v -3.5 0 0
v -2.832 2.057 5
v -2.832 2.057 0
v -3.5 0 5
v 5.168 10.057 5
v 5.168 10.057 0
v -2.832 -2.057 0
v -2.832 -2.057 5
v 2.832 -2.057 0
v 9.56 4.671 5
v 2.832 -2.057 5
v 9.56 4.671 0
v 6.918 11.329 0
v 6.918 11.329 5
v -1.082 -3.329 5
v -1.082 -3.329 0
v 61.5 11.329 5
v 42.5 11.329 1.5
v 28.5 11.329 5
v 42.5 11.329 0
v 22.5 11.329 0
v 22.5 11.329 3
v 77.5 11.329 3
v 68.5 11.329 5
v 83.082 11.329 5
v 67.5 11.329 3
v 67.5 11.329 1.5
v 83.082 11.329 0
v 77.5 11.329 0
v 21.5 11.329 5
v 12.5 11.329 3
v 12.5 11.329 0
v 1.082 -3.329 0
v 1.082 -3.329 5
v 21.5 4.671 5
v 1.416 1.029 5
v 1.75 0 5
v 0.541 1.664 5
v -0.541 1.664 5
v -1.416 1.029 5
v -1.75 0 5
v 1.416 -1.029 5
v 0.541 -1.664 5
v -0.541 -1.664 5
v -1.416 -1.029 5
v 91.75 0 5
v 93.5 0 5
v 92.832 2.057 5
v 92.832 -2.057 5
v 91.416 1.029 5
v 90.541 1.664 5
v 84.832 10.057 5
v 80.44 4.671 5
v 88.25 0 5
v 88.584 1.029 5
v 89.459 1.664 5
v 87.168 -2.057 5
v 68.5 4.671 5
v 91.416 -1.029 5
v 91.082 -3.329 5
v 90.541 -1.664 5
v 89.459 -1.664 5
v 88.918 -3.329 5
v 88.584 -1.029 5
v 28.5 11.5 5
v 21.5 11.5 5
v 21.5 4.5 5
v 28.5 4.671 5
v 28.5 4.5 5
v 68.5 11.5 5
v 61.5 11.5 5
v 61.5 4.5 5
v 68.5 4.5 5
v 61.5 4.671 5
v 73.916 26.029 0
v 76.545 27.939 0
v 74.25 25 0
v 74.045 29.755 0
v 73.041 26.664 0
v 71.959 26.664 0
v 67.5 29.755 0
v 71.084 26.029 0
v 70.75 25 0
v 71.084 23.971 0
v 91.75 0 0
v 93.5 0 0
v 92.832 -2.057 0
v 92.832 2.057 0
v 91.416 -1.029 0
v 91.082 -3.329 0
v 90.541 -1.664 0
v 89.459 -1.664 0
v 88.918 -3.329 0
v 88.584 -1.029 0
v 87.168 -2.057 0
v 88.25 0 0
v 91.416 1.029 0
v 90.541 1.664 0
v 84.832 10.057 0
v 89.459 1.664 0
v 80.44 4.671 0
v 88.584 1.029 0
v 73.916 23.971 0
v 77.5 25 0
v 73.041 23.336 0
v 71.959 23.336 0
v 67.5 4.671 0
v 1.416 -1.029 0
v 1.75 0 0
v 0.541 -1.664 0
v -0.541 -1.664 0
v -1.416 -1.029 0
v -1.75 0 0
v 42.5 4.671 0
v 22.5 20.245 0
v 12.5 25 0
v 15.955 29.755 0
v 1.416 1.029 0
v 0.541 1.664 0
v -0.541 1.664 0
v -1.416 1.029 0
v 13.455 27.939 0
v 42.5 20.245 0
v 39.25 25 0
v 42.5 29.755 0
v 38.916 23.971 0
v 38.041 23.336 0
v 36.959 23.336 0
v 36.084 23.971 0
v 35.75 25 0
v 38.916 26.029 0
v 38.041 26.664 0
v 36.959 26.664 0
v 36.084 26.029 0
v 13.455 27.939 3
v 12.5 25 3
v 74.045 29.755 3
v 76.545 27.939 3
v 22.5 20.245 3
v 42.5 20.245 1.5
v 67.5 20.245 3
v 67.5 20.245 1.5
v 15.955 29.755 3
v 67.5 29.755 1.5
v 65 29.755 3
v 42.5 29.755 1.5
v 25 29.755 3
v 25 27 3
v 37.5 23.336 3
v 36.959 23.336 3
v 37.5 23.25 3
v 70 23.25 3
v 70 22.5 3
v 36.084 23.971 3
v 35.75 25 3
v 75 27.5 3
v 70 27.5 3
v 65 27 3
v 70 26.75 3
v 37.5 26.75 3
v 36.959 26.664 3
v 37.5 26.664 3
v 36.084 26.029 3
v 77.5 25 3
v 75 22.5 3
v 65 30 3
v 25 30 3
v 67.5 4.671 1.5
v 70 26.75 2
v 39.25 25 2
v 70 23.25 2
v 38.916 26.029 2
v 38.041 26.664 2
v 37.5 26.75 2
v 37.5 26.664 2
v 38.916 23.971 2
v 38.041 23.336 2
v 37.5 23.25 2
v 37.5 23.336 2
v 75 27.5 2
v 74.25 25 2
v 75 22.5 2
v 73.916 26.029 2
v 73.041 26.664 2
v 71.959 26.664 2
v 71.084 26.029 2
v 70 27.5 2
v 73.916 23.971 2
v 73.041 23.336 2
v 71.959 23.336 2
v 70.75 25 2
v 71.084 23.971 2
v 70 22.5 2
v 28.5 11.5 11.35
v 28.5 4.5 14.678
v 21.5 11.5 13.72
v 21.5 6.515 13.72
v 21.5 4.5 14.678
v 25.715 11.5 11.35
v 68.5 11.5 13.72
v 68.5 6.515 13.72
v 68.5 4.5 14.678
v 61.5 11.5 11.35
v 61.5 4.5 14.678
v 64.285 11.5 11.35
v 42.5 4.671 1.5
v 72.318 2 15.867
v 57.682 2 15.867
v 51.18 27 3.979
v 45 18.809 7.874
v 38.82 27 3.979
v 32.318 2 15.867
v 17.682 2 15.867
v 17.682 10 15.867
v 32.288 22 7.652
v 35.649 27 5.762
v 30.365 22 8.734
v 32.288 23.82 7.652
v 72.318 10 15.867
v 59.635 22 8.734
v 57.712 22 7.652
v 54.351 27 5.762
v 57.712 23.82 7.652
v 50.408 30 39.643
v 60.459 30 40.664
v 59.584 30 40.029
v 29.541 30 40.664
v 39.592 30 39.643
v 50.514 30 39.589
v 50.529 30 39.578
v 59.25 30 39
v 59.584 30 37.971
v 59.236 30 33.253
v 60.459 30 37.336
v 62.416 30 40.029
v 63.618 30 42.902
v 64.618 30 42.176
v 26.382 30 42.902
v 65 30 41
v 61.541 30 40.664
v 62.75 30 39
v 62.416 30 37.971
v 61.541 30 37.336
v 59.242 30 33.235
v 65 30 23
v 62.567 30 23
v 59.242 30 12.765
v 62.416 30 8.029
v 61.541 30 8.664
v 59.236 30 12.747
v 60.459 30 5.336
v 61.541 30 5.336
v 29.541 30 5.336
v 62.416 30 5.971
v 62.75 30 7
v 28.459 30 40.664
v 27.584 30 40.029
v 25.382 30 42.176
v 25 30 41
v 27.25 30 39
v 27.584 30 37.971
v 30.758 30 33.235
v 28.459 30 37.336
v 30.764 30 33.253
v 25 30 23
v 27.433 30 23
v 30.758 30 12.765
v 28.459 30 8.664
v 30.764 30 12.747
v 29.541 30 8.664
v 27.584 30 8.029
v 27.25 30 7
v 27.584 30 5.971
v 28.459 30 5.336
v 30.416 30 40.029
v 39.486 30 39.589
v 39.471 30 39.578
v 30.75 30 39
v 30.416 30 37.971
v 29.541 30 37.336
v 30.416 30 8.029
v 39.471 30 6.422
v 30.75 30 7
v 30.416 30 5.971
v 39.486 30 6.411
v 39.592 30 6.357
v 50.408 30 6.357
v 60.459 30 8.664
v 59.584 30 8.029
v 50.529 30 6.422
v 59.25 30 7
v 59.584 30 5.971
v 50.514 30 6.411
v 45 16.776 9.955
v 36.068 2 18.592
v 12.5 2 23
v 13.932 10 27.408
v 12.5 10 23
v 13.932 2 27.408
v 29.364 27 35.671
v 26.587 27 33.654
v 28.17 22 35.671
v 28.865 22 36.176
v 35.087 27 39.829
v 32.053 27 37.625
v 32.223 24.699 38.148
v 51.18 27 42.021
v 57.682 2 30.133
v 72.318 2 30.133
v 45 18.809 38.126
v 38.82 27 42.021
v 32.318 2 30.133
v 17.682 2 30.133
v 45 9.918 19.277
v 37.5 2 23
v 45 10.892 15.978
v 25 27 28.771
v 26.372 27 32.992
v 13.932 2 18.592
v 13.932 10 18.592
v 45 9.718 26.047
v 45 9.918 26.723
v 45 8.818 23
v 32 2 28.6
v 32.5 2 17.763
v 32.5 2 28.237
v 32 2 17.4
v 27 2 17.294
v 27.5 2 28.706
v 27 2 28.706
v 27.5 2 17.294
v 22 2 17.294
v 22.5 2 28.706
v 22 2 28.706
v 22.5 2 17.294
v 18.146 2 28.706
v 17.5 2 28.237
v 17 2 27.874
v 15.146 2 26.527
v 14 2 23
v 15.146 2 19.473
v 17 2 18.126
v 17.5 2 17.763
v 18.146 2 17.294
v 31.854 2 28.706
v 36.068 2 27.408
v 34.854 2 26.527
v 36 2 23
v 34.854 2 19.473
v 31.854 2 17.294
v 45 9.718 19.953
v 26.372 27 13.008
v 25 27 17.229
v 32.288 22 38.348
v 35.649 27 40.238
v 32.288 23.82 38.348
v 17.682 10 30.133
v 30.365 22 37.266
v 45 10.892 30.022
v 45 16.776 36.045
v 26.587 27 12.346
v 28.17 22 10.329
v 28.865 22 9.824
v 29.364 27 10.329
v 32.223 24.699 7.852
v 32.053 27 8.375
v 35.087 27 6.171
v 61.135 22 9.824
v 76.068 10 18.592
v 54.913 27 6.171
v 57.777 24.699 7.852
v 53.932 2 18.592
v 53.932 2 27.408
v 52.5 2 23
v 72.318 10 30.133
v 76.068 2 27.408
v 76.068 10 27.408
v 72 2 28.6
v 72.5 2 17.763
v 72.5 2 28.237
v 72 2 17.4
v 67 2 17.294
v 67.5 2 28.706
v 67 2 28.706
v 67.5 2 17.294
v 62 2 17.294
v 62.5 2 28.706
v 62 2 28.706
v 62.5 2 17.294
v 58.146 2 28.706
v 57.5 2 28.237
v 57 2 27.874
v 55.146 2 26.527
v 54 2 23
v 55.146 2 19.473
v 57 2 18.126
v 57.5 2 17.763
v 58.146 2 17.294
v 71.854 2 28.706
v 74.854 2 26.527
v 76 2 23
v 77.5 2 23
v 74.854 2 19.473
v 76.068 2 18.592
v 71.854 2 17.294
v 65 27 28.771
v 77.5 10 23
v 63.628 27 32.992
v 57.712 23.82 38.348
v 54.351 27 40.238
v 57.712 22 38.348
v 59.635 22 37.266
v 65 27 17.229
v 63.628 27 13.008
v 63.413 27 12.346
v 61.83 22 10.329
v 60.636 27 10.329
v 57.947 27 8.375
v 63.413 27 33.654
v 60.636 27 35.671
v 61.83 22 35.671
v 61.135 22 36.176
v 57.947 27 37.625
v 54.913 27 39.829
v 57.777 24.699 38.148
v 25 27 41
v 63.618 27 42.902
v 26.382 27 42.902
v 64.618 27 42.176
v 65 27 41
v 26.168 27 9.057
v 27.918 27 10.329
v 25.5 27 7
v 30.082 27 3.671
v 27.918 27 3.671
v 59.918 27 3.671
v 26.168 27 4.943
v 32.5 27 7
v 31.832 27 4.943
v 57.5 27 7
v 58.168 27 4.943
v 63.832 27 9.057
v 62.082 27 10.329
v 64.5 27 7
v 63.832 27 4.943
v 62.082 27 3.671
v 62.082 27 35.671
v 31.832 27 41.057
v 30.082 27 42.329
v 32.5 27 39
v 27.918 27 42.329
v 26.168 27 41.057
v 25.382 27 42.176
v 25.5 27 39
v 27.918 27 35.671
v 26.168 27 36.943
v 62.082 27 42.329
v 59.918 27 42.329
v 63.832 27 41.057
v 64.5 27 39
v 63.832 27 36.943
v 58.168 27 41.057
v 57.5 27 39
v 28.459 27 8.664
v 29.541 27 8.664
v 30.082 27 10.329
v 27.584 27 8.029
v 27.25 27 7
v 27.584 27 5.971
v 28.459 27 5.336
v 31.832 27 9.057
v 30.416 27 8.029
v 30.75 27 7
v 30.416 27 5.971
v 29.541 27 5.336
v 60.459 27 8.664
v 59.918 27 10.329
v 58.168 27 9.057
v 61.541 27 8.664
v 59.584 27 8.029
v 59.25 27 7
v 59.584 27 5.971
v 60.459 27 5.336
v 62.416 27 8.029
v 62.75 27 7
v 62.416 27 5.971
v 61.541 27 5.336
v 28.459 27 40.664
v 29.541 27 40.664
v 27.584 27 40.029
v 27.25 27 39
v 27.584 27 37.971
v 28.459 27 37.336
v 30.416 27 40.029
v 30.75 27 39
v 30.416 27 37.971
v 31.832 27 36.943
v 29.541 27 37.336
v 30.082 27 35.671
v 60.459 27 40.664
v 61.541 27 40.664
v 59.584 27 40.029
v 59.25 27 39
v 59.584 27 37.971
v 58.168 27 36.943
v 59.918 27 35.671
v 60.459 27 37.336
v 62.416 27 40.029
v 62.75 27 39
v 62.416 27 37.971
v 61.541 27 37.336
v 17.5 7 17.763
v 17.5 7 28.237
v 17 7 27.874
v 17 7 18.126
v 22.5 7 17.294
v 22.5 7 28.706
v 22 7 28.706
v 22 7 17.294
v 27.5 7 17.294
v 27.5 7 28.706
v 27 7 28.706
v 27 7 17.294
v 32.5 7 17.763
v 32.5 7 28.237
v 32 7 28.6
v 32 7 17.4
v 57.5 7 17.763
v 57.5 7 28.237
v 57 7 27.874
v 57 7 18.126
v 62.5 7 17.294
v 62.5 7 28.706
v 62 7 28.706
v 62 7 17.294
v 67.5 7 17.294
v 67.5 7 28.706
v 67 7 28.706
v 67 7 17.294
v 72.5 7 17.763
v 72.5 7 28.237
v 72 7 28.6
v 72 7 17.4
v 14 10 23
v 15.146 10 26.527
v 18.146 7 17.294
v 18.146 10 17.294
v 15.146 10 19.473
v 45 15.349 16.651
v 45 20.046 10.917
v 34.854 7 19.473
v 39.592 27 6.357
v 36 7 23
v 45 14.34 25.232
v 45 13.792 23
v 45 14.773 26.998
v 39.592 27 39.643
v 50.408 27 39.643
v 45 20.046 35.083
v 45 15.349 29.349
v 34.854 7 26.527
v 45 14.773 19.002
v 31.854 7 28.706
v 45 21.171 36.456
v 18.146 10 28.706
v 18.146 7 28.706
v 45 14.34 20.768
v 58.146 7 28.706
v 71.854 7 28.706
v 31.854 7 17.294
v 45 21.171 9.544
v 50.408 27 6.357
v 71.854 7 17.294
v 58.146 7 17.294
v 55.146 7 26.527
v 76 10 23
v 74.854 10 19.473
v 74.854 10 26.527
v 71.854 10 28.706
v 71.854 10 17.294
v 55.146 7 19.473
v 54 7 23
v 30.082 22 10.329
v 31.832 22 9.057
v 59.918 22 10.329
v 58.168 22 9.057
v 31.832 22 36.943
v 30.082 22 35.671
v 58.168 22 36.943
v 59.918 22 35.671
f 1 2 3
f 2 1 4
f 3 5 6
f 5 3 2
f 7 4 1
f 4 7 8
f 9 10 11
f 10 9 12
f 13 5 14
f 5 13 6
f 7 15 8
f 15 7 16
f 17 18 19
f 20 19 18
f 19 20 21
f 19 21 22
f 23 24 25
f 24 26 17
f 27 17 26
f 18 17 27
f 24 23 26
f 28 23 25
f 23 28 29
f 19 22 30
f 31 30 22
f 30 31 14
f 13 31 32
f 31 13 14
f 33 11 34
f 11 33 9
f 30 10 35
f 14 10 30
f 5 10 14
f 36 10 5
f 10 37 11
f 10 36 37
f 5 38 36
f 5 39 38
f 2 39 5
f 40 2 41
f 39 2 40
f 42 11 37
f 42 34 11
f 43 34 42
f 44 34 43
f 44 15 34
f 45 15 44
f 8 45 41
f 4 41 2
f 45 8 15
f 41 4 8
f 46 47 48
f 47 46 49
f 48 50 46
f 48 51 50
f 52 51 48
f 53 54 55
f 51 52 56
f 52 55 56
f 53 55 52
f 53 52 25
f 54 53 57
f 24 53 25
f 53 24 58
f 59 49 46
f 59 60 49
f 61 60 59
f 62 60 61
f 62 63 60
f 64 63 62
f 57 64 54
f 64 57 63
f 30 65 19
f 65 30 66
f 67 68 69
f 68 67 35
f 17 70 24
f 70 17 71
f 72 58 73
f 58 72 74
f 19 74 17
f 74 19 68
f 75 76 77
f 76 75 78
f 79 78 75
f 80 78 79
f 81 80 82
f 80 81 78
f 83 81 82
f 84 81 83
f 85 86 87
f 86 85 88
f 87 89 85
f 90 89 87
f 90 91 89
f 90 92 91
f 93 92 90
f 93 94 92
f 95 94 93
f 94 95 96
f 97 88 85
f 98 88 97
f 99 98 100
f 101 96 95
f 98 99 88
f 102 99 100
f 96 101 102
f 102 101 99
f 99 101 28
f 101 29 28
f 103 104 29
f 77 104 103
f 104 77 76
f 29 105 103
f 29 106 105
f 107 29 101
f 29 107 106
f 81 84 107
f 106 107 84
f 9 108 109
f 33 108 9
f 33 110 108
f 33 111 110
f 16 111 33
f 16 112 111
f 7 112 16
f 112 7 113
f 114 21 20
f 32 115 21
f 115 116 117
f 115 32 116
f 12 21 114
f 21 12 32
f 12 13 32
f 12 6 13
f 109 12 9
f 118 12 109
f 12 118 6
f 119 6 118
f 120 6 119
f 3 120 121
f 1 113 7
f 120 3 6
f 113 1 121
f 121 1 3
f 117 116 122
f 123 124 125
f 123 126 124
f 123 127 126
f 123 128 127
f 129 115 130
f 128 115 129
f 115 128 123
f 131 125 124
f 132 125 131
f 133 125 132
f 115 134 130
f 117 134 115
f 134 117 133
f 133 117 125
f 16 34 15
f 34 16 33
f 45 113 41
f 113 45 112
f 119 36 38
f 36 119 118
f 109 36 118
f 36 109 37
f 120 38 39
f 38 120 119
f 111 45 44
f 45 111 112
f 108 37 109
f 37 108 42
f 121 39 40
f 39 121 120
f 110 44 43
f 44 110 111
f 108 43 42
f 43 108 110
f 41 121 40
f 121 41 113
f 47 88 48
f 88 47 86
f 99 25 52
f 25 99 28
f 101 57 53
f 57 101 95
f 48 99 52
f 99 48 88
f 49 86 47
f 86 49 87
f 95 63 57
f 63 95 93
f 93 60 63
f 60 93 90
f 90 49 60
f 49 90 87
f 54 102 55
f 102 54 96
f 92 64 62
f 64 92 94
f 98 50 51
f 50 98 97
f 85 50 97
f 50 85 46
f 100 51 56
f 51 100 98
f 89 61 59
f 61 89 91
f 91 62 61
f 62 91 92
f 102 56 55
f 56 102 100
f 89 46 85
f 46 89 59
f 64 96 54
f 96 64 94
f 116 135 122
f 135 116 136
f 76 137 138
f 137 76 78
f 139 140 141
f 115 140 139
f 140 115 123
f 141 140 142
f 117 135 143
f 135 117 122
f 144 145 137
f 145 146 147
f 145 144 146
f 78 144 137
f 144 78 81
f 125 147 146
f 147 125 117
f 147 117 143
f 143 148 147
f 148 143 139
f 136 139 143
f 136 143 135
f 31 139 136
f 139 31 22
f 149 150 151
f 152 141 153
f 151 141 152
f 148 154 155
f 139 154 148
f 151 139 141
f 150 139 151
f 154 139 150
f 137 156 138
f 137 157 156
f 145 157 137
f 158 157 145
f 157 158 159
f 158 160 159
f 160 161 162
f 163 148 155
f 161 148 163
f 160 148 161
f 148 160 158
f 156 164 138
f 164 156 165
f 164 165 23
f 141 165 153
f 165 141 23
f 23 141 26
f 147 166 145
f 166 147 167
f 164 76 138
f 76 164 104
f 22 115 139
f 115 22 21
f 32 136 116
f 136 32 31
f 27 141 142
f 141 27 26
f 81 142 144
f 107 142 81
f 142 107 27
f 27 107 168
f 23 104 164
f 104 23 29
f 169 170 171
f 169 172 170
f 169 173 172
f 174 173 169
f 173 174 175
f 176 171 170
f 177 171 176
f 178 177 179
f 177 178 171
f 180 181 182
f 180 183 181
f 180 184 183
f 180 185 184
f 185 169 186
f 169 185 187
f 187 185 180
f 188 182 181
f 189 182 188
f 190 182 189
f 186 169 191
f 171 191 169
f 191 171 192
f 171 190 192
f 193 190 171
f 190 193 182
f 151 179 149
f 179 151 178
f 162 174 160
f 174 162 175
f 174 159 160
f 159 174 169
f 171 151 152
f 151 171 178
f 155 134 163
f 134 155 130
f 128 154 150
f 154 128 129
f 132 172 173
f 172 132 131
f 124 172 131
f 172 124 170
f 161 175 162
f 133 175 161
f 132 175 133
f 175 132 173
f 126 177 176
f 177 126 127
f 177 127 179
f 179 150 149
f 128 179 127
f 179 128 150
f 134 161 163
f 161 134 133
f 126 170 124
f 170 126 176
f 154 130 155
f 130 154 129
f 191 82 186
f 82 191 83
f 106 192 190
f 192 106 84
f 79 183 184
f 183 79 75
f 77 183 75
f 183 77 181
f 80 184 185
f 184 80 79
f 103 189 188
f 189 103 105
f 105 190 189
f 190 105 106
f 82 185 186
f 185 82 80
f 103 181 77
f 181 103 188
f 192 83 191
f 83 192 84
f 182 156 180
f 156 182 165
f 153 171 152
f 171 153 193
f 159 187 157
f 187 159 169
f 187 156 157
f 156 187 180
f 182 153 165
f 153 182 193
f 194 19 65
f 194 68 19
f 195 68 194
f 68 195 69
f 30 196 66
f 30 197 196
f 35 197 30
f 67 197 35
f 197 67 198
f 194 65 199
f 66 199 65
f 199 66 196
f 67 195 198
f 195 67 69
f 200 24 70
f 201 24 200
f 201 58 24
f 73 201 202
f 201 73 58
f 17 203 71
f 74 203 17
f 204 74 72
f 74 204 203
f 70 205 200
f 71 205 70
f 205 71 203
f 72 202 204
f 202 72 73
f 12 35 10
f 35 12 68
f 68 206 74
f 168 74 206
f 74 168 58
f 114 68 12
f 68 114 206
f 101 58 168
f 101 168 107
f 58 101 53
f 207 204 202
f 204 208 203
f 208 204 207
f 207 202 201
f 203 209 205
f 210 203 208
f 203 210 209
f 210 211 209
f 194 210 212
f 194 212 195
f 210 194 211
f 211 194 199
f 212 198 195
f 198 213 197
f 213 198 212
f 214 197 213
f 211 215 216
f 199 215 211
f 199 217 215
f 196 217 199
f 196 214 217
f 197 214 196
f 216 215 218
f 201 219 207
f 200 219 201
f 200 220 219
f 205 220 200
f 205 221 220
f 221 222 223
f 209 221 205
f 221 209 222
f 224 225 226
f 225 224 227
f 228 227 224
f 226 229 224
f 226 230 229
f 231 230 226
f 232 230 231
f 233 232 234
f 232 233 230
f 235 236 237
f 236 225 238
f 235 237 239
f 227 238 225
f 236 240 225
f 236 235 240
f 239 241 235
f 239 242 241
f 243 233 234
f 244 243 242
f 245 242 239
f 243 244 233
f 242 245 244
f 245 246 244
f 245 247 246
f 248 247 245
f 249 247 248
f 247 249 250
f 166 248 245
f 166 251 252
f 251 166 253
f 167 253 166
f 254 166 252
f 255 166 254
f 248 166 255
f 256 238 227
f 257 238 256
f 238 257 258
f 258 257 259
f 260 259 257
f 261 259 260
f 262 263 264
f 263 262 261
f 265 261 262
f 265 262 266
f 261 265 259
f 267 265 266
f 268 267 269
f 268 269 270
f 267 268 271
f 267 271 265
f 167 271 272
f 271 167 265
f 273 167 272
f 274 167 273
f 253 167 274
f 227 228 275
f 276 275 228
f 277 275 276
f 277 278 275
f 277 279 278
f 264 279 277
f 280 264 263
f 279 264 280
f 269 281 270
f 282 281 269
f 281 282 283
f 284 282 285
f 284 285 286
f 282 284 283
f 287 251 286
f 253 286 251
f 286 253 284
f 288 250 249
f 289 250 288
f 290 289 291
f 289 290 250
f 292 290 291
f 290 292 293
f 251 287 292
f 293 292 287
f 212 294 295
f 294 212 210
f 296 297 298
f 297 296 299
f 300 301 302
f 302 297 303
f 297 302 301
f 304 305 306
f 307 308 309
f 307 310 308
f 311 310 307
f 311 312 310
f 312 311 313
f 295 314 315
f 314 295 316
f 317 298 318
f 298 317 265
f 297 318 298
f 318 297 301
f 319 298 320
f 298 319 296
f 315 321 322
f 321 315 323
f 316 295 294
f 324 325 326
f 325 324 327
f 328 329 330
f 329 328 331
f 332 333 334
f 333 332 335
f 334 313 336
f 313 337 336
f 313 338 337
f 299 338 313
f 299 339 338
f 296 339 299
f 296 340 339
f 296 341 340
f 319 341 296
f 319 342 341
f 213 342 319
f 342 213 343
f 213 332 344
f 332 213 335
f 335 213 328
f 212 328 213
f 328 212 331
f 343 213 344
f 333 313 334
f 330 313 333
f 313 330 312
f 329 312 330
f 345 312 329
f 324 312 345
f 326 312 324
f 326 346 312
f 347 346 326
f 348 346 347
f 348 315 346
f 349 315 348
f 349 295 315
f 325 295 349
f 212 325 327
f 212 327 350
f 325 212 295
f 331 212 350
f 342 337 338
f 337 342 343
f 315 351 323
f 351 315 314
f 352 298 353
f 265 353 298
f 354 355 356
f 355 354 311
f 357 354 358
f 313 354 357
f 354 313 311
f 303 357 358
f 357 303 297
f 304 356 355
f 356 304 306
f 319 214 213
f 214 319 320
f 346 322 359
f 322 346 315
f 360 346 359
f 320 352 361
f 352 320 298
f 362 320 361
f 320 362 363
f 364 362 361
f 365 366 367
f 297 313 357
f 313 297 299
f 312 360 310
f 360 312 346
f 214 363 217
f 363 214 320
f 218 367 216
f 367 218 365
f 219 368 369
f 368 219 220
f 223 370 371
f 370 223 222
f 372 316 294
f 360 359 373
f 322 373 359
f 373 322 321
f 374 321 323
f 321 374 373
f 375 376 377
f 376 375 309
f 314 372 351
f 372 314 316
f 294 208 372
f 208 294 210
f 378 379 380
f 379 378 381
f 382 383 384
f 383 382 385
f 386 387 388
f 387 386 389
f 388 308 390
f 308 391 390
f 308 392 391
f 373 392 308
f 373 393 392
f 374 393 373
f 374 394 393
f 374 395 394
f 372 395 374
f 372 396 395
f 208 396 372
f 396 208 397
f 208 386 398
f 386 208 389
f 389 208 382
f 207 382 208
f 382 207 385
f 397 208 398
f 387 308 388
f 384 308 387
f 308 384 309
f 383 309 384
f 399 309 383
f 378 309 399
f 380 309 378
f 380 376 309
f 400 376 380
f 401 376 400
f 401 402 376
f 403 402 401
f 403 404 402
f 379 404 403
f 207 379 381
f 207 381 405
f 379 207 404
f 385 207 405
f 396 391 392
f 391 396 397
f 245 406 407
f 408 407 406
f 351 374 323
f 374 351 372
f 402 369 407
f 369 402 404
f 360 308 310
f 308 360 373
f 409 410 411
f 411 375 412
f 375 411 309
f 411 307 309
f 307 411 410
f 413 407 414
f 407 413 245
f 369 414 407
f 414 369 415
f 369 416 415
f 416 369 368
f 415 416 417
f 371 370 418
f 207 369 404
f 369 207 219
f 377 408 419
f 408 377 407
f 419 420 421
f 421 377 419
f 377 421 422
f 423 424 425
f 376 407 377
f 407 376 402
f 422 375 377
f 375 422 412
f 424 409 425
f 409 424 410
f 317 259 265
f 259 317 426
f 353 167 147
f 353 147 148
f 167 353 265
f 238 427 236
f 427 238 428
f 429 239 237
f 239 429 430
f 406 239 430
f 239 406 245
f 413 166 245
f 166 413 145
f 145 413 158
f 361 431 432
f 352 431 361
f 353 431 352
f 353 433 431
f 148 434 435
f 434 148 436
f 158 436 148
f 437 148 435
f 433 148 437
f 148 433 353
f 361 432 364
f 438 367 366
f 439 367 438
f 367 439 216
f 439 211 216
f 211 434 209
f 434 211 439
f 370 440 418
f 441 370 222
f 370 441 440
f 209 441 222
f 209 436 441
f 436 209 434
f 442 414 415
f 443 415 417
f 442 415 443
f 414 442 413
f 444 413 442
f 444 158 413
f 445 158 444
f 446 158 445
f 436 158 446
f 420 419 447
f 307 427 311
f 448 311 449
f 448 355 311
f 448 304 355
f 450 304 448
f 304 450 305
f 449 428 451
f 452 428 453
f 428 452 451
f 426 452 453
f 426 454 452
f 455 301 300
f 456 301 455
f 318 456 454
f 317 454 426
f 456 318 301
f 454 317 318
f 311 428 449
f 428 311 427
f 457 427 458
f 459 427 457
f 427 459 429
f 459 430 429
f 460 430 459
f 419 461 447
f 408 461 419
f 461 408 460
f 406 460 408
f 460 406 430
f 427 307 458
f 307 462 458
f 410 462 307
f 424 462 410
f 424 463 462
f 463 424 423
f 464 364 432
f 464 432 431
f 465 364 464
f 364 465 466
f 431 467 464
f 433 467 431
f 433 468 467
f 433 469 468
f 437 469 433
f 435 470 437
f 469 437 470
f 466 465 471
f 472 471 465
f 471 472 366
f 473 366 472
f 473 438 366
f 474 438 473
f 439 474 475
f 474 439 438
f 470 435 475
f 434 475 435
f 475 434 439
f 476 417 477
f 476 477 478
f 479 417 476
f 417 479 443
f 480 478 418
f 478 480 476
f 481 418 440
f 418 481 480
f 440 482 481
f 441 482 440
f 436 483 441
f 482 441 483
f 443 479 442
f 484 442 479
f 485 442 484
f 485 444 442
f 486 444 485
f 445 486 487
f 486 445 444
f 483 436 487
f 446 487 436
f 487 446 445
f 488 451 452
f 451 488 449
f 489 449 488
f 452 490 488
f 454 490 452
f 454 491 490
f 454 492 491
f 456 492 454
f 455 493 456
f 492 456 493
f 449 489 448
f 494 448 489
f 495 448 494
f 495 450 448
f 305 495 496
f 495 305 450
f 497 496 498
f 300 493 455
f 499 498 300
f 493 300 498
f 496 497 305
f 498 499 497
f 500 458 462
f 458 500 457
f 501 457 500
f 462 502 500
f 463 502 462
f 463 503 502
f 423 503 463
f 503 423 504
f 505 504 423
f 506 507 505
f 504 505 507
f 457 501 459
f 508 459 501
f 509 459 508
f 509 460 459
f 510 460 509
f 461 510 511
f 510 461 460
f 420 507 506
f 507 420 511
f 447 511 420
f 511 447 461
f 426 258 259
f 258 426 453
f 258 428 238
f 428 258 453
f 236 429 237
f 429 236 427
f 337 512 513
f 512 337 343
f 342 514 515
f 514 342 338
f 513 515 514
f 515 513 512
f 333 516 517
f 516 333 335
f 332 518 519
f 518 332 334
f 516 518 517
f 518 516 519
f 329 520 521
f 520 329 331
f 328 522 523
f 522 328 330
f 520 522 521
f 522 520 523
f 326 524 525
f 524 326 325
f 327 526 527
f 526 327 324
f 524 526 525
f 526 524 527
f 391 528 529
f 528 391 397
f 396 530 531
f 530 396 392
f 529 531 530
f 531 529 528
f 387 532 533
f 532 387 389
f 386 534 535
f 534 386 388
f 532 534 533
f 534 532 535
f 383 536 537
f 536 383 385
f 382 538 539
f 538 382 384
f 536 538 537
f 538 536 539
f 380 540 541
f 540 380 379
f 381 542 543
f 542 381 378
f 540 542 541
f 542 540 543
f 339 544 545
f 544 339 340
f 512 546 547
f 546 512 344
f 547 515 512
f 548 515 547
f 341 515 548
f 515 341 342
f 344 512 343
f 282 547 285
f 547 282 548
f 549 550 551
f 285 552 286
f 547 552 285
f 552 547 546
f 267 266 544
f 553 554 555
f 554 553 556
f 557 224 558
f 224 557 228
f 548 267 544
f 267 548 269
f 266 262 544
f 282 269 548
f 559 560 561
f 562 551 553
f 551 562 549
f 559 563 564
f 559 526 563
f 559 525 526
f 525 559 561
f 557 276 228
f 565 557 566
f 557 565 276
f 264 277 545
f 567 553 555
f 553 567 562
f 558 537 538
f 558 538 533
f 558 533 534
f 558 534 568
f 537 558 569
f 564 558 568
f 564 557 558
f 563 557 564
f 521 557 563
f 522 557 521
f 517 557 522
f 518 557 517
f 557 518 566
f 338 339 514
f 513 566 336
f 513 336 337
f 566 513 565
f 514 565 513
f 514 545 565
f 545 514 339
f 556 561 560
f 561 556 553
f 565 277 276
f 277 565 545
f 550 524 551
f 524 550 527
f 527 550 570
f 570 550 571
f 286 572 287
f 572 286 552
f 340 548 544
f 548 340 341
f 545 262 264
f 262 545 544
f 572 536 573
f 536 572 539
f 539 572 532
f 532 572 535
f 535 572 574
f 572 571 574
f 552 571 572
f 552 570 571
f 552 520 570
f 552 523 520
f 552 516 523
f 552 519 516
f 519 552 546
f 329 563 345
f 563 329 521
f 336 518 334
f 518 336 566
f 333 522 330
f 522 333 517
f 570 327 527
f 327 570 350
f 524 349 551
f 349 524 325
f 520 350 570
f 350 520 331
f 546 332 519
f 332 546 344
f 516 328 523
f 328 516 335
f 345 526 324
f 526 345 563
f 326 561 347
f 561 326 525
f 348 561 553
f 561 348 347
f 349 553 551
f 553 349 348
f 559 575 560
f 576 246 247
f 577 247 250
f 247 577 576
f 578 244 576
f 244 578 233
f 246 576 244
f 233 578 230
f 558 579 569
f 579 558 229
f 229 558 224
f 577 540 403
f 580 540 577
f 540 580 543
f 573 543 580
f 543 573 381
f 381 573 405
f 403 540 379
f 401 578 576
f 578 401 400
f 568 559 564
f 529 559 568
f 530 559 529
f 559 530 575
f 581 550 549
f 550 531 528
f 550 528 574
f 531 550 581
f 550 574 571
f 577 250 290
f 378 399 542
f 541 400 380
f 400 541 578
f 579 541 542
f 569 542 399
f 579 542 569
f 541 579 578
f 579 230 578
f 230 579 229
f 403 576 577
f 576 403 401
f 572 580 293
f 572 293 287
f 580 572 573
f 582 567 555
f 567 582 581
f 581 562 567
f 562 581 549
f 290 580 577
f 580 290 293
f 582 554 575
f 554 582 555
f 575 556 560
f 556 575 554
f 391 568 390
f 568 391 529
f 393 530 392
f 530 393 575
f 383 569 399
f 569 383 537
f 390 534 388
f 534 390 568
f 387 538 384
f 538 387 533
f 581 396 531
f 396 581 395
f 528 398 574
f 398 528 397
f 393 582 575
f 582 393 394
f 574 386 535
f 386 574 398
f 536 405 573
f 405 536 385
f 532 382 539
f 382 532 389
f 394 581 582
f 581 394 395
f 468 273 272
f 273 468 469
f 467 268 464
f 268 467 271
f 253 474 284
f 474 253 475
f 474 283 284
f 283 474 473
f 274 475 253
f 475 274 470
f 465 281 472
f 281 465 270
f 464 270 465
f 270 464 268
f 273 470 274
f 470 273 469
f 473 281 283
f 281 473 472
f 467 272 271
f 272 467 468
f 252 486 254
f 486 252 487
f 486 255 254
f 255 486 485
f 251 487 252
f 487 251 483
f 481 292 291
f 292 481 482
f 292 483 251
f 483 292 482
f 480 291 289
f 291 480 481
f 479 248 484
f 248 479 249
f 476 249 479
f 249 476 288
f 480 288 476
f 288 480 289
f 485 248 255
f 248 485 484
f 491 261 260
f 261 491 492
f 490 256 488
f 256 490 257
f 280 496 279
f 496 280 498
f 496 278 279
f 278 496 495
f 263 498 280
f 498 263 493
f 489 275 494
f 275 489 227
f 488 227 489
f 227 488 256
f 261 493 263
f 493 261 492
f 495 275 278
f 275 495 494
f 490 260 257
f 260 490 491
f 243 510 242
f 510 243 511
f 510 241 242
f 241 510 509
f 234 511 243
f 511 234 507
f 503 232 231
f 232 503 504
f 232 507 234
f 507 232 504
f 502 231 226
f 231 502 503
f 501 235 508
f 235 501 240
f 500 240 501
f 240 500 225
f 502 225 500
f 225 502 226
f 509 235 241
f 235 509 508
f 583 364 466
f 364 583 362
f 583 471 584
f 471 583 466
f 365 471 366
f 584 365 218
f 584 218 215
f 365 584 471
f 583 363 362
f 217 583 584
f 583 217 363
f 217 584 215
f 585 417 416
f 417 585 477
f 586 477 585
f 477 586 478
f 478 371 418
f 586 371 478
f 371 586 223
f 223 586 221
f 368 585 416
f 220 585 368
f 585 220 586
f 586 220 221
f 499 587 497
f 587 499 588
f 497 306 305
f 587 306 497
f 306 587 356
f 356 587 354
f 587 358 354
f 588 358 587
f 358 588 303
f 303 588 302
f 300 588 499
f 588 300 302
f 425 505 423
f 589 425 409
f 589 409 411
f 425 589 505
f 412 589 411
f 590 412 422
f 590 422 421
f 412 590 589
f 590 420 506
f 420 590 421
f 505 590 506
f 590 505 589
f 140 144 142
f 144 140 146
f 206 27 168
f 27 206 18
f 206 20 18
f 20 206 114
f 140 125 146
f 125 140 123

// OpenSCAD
/*[Fan Duct]*/
//Print right duct?
right_side = 1;	  //[1:yes,0:no]
//Print left duct?
left_side  = 1;   //[1:yes,0:no]
//Print guard?
guard      = 1;   //[1:yes,0:no]
//How to Print?
print_in_one = 1;   //[1:InOne,0:Seperate]

/*[Hidden]*/
$fa = 5;
$fn = 50 / $fa; 

module base()
{
  union()
  {
    difference()
    {
      hull() {
        translate([8,8])
          cylinder(h= 5, d=7);
        
        cylinder(h= 5, d=7);
      }
      
      cylinder(h= 5.0, d=3.5);
    }

    hull() {
      translate([8,8])
        cylinder(h= 5, d=7);
      
      translate([82,8])
        cylinder(h= 5, d=7);
    }

    difference()
    {
      hull() {
        translate([82,8])
          cylinder(h= 5, d=7);
        
        translate([90,0])
          cylinder(h= 5, d=7);
      }
      
      translate([90,0])
        cylinder(h= 5, d=3.5);
    }

    difference()
    {
      union () {
        hull() {
          translate([17.5,25])
            cylinder(h=3, d =10);

          translate([72.5,25])
            cylinder(h=3, d =10);
        }

        hull() {
          translate([17.5,25])
            cylinder(h=3, d =10);

          translate([17.5,10])
            cylinder(h=3, d =10);
        }

        hull() {
          translate([72.5,10])
            cylinder(h=3, d =10);

          translate([72.5,25])
            cylinder(h=3, d =10);
        }
      }
       
      translate([37.5,25-1.75,2])
        cube([35,3.5,1.05]);
      
      translate([37.5,25])
        cylinder(h=5, d =3.5);

      translate([72.5,25])
        cylinder(h= 5, d=3.5);
      
      translate([70,22.5,2])
        cube([5,5,1.51]);
    }

    translate([25,27,3])
    {
      // stuetzen
      if (left_side)
      {
        translate([-3.5,-22.5,2])
          cube([7,7,14]);
      }
      
      if (right_side)
      {
        translate([-3.5+40,-22.5,2])
          cube([7,7,14]);
      }
    }
  }
}

module duct(hollow)
{
  translate([25,27,3])  //translate([5,32,0])
  union() {
    difference()
    {
      union() {
        
        /*
        // fan
        translate([2,0,2]) minkowski()
        {
          cube([36,2,36]);
          
          rotate([-90,0,0])
            cylinder(d=4,h=1);
        }
        */
        
        hull()
        {
          cube([40,3,3]);
          
          translate([2,0,38])
            rotate([-90,0,0])
              cylinder(d=4, h=3);

          translate([38,0,38])
            rotate([-90,0,0])
              cylinder(d=4, h=3);
        }
        
        if (left_side)
        {
          // links
          hull(){
            hull() {
              translate([5,-25,20])
                rotate([-90,0,0])
                  cylinder(h=3, d = 15);
                  
              translate([-5,-25,20])
                rotate([-90,0,0])
                  cylinder(h=8, d = 15);
            }      
            
            translate([20,0,20])
              rotate([-90,0,0])
                cylinder(h=3, d = 40);
          }

          hull() {
            translate([5,-25,20])
              rotate([-90,0,0])
                cylinder(h=5, d = 15);
                
            translate([-5,-25,20])
              rotate([-90,0,0])
                cylinder(h=5, d = 15);
          }        
        }
        
        if (right_side)
        {
          //rechts
          hull(){
            hull() {
              translate([40+5,-25,20])
                rotate([-90,0,0])
                  cylinder(h=8, d = 15);
                  
              translate([40-5,-25,20])
                rotate([-90,0,0])
                  cylinder(h=3, d = 15);
            }      
            
            translate([20,0,20])
              rotate([-90,0,0])
                cylinder(h=3, d = 40);
          }

          hull() {
            translate([40+5,-25,20])
              rotate([-90,0,0])
                cylinder(h=5, d = 15);
                
            translate([40-5,-25,20])
              rotate([-90,0,0])
                cylinder(h=5, d = 15);
          }      
        }
      }

      if (hollow)
      {
        //hohlraum
        union() {
          if (left_side)
          {
            // links
            hull(){
              hull() {
                translate([5,-20,20])
                  rotate([-90,0,0])
                    cylinder(h=3, d = 12);
                    
                translate([-5,-20,20])
                  rotate([-90,0,0])
                    cylinder(h=3, d = 12);
              }      
              
              translate([20,0,20])
                rotate([-90,0,0])
                  cylinder(h=3.1, d = 35);
            }

            hull() {
              translate([5,-25.25,20])
                rotate([-90,0,0])
                  cylinder(h=5.5, d = 12);
                  
              translate([-5,-25.25,20])
                rotate([-90,0,0])
                  cylinder(h=5.5, d = 12);
            }      
          }
            
          if (right_side)
          {
            //rechts
            hull(){
              hull() {
                translate([40+5,-20,20])
                  rotate([-90,0,0])
                    cylinder(h=3, d = 12);
                    
                translate([40-5,-20,20])
                  rotate([-90,0,0])
                    cylinder(h=3, d = 12);
              }      
              
              translate([20,0,20])
                rotate([-90,0,0])
                  cylinder(h=3.1, d = 35);
            }

            hull() {
              translate([40+5,-25.25,20])
                rotate([-90,0,0])
                  cylinder(h=5.5, d = 12);
                  
              translate([40-5,-25.25,20])
                rotate([-90,0,0])
                  cylinder(h=5.5, d = 12);
            }           
          }
        }
      }
        
      if (!right_side && !left_side)  
      {
        translate([-9,3,4])          
          rotate([90,0,0])
           linear_extrude(height = 3, $fn = 50) 
            text("\u263b", 40);
      }
      
      // loecher
      translate([4,-1,4])
        rotate([-90,0,0])
          cylinder(h=5, d =3.5);

      translate([40-4,-1,4])
        rotate([-90,0,0])
          cylinder(h=5, d =3.5);

      translate([4,-1,40-4])
        rotate([-90,0,0])
          cylinder(h=5, d =3.5);

      translate([40-4,-1,40-4])
        rotate([-90,0,0])
          cylinder(h=5, d =3.5);

      // muttern
      translate([4,-5,4])
        rotate([-90,0,0])
          cylinder(h=5, d =7);

      translate([40-4,-5,4])
        rotate([-90,0,0])
          cylinder(h=5, d =7);

      translate([4,-5,40-4])
        rotate([-90,0,0])
          cylinder(h=5, d =7);

      translate([40-4,-5,40-4])
        rotate([-90,0,0])
          cylinder(h=5, d =7);
    }
    
    if (guard) 
    {
      if (left_side)
      {
        // gitter
        for (a =[1:4])
          translate([a*5-13,-25,14])
            cube([0.5,5,12]);
      }
      
      if (right_side)
      {
        for (a =[1:4])
          translate([a*5-13+40,-25,14])
            cube([0.5,5,12]);
      }
    }
  }
}  

difference()
{
  union () 
  {
    difference()
    {
      base();
        duct(false);
    }
    
    if (!print_in_one)
    {
      translate([0,40,30])
        rotate([-90,0,0])
          duct(true);
    } else {
      duct(true);
    }
  }
  
  
  translate([42.5,4,-0.1])
    cube([25,30,1.6]);
  
  /*
  translate([12.49,4,-0.1])
    cube([65.02,30,6]);
  */
  
}
